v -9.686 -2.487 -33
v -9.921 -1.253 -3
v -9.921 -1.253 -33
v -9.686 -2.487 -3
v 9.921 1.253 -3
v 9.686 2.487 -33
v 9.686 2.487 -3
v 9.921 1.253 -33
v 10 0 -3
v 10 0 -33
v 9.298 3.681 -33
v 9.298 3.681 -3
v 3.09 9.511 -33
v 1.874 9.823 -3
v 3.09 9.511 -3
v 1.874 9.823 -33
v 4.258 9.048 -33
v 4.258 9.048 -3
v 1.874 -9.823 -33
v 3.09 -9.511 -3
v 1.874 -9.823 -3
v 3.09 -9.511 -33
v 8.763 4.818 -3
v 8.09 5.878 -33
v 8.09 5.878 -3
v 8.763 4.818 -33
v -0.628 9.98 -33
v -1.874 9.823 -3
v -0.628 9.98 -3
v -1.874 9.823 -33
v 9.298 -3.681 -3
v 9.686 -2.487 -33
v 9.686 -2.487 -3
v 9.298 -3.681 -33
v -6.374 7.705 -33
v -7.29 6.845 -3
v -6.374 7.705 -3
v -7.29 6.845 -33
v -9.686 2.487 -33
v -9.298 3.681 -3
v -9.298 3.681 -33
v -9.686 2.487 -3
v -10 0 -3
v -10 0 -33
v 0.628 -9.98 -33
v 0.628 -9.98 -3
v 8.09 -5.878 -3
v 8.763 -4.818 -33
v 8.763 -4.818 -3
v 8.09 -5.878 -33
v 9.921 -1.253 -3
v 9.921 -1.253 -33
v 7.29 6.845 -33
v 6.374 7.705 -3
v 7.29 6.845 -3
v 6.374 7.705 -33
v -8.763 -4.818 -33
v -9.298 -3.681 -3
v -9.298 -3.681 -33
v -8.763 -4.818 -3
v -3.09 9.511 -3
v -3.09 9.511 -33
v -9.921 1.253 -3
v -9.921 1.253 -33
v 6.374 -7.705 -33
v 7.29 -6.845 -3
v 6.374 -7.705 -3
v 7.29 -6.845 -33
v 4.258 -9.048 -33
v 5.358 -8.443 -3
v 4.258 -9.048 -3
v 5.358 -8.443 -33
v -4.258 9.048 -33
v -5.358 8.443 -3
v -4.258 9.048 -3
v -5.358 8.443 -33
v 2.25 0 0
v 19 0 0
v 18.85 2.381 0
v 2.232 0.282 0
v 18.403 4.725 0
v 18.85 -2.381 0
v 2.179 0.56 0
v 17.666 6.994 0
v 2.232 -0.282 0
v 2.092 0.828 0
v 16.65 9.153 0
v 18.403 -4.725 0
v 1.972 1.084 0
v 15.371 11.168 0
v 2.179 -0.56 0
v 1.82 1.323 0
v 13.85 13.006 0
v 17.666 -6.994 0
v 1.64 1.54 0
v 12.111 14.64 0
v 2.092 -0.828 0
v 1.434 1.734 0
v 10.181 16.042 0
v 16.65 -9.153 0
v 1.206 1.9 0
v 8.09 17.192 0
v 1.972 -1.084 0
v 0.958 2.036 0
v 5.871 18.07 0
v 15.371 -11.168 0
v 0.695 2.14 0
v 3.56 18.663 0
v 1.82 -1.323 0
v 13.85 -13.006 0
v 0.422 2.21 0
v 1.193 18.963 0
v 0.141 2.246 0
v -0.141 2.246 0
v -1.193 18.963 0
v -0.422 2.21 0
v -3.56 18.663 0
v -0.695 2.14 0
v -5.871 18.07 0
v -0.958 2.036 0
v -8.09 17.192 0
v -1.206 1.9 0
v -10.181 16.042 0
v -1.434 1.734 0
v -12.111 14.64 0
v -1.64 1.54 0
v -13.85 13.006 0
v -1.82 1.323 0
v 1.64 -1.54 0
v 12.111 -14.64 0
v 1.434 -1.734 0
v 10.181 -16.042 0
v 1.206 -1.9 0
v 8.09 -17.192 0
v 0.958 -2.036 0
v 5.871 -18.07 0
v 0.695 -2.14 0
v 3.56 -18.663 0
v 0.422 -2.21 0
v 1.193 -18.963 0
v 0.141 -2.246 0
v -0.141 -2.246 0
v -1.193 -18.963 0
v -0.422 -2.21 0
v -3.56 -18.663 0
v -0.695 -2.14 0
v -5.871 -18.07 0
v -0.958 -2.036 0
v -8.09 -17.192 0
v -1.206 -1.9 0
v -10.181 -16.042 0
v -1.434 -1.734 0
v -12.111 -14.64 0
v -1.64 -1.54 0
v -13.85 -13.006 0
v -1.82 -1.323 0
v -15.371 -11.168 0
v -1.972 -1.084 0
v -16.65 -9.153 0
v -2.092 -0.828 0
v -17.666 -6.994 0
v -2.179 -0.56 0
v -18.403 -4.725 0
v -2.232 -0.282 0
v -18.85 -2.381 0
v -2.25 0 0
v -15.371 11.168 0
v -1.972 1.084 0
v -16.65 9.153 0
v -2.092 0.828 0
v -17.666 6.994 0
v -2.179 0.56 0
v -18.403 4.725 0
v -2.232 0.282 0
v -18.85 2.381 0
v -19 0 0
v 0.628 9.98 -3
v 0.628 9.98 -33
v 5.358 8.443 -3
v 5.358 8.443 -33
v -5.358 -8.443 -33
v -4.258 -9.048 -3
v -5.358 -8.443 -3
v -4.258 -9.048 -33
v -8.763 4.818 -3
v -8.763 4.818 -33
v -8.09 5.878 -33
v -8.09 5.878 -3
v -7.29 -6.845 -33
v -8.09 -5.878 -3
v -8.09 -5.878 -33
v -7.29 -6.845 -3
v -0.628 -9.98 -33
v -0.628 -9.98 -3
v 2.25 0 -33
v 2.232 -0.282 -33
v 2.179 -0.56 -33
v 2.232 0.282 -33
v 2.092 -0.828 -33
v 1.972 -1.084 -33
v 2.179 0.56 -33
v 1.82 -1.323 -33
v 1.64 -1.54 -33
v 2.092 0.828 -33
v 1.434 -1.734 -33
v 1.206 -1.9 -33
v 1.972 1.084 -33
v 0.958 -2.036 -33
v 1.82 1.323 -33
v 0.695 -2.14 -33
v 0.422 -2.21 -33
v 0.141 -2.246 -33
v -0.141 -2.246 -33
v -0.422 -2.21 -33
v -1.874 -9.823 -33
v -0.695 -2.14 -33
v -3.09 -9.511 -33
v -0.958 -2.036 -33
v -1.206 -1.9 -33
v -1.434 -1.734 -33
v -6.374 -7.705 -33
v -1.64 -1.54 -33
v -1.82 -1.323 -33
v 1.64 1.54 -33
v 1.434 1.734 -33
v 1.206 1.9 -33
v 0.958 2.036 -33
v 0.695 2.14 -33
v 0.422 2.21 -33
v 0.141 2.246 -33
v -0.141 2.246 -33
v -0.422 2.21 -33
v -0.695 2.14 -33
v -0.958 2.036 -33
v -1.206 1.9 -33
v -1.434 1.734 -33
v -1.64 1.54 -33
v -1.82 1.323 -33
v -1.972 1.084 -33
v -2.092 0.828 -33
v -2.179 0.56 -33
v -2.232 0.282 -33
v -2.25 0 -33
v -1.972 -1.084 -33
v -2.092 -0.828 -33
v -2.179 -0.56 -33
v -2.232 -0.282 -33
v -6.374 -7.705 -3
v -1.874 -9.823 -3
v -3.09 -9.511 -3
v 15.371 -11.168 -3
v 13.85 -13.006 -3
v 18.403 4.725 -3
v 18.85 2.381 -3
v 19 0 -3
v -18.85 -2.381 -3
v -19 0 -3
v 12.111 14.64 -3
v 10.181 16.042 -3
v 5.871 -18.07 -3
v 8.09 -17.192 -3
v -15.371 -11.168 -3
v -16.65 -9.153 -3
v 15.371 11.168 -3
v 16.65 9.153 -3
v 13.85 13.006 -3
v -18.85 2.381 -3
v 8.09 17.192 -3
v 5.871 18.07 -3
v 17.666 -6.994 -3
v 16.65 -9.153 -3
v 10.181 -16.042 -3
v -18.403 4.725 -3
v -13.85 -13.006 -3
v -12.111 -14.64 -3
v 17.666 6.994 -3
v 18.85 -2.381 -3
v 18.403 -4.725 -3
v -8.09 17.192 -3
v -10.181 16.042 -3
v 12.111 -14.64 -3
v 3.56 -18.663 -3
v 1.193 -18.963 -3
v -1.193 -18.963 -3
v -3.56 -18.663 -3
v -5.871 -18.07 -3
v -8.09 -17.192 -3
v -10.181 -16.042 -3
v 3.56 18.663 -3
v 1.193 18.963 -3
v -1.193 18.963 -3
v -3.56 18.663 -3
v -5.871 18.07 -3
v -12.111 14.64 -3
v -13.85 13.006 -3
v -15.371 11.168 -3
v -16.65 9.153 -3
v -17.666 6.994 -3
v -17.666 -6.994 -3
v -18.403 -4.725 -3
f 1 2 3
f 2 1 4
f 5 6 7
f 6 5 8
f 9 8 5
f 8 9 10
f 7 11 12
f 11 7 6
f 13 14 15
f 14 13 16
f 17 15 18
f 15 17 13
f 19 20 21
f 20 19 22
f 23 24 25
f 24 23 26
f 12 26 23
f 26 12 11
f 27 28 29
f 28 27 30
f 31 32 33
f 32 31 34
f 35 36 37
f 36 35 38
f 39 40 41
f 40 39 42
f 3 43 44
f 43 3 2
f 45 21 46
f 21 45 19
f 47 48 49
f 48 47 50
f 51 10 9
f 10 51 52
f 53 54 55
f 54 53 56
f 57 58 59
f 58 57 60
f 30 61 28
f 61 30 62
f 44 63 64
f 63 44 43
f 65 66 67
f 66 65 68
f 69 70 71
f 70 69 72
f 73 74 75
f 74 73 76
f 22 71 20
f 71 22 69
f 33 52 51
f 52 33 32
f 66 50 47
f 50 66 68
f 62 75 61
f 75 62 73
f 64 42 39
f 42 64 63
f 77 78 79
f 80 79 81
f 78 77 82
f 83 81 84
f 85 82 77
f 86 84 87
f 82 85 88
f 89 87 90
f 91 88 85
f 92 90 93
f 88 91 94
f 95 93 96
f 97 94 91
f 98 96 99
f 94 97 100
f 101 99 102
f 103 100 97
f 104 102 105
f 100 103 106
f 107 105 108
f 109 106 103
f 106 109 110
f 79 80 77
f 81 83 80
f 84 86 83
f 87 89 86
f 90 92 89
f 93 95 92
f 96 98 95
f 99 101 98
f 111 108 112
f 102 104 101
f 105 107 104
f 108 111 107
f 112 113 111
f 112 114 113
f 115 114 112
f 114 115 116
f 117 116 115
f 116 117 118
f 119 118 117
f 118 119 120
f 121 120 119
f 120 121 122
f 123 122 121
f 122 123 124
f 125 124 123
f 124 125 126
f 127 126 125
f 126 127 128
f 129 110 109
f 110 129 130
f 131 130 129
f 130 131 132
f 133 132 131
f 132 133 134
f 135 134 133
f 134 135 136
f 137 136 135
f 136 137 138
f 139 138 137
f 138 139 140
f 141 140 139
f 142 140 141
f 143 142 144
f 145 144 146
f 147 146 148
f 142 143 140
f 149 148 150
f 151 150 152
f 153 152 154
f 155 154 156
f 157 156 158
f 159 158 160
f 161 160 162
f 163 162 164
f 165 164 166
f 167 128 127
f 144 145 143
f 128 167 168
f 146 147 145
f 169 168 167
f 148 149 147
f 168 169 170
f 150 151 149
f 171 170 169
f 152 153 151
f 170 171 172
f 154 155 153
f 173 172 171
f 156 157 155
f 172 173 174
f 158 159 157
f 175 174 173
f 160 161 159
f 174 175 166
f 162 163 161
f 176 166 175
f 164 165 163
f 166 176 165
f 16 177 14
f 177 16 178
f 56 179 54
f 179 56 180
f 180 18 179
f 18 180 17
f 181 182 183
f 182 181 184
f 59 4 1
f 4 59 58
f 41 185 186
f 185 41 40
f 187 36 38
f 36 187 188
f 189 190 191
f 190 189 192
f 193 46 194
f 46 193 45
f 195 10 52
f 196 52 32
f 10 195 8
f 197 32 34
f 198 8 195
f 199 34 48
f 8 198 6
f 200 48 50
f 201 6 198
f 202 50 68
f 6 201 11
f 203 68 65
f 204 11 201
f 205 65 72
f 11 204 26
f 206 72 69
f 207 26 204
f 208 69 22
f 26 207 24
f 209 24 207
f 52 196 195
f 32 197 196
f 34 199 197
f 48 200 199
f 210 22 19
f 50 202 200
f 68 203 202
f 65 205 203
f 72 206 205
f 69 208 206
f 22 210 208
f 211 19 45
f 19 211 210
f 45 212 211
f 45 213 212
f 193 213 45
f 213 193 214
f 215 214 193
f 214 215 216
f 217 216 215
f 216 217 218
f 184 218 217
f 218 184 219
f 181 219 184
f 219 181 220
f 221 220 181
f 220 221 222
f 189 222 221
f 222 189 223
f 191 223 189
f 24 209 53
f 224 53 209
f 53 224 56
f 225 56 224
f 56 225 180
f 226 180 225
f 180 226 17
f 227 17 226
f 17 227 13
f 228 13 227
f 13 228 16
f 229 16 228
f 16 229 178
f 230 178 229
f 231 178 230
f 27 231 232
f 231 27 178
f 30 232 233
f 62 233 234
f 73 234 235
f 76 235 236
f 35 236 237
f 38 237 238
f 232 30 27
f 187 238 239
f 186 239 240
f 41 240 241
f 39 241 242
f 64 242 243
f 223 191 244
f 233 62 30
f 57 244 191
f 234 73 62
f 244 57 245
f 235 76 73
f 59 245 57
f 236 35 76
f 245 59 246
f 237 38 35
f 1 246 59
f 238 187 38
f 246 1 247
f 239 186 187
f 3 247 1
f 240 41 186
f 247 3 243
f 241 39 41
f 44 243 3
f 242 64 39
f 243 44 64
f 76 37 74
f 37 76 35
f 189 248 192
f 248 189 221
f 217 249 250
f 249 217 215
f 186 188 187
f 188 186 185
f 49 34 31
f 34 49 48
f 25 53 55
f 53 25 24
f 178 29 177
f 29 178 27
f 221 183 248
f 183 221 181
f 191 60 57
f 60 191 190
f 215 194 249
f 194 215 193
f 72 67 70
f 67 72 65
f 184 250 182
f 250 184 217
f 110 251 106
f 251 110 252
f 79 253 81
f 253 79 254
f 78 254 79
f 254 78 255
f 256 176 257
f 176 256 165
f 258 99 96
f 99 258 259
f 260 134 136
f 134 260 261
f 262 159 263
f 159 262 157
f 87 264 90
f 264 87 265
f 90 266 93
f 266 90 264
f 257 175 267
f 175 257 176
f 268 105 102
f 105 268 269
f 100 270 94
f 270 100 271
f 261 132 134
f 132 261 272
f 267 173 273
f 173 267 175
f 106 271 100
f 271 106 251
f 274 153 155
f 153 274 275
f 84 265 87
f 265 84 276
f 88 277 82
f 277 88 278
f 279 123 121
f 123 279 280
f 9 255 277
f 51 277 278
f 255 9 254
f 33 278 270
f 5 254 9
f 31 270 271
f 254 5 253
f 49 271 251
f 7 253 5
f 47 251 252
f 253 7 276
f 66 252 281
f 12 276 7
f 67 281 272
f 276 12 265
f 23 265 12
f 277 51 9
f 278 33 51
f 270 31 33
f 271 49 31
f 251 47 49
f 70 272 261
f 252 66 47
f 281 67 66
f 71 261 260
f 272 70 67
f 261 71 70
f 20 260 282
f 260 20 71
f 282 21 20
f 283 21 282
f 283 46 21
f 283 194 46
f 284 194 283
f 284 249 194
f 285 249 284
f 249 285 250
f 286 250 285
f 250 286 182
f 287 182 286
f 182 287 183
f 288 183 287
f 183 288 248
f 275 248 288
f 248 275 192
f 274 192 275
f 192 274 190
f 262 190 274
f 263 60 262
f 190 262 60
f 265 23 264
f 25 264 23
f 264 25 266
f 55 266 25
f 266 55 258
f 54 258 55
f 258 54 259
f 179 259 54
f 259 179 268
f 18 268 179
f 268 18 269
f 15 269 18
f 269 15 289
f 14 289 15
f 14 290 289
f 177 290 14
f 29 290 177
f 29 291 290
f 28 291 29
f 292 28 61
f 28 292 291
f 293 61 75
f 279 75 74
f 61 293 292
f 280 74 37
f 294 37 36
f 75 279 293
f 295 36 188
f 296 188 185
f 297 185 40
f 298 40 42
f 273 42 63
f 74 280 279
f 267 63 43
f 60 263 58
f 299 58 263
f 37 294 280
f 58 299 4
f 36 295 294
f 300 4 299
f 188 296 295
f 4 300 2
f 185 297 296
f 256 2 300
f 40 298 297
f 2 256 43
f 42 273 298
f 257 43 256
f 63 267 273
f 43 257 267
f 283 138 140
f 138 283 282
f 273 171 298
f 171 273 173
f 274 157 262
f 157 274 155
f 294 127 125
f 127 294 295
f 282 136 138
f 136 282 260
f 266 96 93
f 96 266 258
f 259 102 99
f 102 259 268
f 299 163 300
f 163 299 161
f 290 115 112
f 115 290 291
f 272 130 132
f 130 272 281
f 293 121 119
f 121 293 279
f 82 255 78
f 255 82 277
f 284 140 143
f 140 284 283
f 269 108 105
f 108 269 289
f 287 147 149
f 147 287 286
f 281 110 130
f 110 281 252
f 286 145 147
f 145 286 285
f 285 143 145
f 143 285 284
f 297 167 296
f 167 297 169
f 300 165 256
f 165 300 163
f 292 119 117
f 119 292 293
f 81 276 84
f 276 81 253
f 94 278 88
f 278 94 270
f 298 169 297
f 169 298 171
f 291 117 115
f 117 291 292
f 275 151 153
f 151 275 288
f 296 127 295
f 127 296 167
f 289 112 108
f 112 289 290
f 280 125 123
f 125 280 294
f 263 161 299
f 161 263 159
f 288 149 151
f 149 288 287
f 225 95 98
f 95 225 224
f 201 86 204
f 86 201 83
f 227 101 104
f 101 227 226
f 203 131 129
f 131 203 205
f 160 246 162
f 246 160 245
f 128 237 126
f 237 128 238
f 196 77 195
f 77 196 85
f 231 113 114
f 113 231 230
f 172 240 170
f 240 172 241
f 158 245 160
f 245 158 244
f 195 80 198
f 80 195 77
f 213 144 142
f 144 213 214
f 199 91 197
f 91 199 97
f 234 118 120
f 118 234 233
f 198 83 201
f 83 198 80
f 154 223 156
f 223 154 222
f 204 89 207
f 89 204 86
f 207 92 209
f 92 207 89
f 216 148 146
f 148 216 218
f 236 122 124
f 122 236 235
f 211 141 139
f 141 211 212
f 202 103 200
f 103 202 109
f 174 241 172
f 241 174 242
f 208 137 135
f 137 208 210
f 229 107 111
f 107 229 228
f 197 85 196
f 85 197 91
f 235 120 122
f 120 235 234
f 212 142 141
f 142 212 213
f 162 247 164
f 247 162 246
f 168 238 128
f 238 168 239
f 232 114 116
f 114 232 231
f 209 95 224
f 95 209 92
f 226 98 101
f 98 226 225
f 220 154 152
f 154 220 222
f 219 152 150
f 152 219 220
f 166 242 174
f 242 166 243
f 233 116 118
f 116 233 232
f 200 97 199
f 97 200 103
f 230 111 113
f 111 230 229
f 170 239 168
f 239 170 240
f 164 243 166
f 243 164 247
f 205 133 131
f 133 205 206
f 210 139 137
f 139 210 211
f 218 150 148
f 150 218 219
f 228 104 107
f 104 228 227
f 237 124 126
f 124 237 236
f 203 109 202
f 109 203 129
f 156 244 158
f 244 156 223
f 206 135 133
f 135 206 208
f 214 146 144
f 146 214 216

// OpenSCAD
$fn = 50;


difference() {
	union() {
		translate(v = [0, 0, -33.0000000000]) {
			cylinder(h = 33, r = 10.0000000000);
		}
		translate(v = [0, 0, -3.0000000000]) {
			cylinder(h = 3, r = 19.0000000000);
		}
	}
	union() {
		#translate(v = [0, 0, -33]) {
			cylinder(h = 33, r = 2.2500000000);
		}
	}
}
